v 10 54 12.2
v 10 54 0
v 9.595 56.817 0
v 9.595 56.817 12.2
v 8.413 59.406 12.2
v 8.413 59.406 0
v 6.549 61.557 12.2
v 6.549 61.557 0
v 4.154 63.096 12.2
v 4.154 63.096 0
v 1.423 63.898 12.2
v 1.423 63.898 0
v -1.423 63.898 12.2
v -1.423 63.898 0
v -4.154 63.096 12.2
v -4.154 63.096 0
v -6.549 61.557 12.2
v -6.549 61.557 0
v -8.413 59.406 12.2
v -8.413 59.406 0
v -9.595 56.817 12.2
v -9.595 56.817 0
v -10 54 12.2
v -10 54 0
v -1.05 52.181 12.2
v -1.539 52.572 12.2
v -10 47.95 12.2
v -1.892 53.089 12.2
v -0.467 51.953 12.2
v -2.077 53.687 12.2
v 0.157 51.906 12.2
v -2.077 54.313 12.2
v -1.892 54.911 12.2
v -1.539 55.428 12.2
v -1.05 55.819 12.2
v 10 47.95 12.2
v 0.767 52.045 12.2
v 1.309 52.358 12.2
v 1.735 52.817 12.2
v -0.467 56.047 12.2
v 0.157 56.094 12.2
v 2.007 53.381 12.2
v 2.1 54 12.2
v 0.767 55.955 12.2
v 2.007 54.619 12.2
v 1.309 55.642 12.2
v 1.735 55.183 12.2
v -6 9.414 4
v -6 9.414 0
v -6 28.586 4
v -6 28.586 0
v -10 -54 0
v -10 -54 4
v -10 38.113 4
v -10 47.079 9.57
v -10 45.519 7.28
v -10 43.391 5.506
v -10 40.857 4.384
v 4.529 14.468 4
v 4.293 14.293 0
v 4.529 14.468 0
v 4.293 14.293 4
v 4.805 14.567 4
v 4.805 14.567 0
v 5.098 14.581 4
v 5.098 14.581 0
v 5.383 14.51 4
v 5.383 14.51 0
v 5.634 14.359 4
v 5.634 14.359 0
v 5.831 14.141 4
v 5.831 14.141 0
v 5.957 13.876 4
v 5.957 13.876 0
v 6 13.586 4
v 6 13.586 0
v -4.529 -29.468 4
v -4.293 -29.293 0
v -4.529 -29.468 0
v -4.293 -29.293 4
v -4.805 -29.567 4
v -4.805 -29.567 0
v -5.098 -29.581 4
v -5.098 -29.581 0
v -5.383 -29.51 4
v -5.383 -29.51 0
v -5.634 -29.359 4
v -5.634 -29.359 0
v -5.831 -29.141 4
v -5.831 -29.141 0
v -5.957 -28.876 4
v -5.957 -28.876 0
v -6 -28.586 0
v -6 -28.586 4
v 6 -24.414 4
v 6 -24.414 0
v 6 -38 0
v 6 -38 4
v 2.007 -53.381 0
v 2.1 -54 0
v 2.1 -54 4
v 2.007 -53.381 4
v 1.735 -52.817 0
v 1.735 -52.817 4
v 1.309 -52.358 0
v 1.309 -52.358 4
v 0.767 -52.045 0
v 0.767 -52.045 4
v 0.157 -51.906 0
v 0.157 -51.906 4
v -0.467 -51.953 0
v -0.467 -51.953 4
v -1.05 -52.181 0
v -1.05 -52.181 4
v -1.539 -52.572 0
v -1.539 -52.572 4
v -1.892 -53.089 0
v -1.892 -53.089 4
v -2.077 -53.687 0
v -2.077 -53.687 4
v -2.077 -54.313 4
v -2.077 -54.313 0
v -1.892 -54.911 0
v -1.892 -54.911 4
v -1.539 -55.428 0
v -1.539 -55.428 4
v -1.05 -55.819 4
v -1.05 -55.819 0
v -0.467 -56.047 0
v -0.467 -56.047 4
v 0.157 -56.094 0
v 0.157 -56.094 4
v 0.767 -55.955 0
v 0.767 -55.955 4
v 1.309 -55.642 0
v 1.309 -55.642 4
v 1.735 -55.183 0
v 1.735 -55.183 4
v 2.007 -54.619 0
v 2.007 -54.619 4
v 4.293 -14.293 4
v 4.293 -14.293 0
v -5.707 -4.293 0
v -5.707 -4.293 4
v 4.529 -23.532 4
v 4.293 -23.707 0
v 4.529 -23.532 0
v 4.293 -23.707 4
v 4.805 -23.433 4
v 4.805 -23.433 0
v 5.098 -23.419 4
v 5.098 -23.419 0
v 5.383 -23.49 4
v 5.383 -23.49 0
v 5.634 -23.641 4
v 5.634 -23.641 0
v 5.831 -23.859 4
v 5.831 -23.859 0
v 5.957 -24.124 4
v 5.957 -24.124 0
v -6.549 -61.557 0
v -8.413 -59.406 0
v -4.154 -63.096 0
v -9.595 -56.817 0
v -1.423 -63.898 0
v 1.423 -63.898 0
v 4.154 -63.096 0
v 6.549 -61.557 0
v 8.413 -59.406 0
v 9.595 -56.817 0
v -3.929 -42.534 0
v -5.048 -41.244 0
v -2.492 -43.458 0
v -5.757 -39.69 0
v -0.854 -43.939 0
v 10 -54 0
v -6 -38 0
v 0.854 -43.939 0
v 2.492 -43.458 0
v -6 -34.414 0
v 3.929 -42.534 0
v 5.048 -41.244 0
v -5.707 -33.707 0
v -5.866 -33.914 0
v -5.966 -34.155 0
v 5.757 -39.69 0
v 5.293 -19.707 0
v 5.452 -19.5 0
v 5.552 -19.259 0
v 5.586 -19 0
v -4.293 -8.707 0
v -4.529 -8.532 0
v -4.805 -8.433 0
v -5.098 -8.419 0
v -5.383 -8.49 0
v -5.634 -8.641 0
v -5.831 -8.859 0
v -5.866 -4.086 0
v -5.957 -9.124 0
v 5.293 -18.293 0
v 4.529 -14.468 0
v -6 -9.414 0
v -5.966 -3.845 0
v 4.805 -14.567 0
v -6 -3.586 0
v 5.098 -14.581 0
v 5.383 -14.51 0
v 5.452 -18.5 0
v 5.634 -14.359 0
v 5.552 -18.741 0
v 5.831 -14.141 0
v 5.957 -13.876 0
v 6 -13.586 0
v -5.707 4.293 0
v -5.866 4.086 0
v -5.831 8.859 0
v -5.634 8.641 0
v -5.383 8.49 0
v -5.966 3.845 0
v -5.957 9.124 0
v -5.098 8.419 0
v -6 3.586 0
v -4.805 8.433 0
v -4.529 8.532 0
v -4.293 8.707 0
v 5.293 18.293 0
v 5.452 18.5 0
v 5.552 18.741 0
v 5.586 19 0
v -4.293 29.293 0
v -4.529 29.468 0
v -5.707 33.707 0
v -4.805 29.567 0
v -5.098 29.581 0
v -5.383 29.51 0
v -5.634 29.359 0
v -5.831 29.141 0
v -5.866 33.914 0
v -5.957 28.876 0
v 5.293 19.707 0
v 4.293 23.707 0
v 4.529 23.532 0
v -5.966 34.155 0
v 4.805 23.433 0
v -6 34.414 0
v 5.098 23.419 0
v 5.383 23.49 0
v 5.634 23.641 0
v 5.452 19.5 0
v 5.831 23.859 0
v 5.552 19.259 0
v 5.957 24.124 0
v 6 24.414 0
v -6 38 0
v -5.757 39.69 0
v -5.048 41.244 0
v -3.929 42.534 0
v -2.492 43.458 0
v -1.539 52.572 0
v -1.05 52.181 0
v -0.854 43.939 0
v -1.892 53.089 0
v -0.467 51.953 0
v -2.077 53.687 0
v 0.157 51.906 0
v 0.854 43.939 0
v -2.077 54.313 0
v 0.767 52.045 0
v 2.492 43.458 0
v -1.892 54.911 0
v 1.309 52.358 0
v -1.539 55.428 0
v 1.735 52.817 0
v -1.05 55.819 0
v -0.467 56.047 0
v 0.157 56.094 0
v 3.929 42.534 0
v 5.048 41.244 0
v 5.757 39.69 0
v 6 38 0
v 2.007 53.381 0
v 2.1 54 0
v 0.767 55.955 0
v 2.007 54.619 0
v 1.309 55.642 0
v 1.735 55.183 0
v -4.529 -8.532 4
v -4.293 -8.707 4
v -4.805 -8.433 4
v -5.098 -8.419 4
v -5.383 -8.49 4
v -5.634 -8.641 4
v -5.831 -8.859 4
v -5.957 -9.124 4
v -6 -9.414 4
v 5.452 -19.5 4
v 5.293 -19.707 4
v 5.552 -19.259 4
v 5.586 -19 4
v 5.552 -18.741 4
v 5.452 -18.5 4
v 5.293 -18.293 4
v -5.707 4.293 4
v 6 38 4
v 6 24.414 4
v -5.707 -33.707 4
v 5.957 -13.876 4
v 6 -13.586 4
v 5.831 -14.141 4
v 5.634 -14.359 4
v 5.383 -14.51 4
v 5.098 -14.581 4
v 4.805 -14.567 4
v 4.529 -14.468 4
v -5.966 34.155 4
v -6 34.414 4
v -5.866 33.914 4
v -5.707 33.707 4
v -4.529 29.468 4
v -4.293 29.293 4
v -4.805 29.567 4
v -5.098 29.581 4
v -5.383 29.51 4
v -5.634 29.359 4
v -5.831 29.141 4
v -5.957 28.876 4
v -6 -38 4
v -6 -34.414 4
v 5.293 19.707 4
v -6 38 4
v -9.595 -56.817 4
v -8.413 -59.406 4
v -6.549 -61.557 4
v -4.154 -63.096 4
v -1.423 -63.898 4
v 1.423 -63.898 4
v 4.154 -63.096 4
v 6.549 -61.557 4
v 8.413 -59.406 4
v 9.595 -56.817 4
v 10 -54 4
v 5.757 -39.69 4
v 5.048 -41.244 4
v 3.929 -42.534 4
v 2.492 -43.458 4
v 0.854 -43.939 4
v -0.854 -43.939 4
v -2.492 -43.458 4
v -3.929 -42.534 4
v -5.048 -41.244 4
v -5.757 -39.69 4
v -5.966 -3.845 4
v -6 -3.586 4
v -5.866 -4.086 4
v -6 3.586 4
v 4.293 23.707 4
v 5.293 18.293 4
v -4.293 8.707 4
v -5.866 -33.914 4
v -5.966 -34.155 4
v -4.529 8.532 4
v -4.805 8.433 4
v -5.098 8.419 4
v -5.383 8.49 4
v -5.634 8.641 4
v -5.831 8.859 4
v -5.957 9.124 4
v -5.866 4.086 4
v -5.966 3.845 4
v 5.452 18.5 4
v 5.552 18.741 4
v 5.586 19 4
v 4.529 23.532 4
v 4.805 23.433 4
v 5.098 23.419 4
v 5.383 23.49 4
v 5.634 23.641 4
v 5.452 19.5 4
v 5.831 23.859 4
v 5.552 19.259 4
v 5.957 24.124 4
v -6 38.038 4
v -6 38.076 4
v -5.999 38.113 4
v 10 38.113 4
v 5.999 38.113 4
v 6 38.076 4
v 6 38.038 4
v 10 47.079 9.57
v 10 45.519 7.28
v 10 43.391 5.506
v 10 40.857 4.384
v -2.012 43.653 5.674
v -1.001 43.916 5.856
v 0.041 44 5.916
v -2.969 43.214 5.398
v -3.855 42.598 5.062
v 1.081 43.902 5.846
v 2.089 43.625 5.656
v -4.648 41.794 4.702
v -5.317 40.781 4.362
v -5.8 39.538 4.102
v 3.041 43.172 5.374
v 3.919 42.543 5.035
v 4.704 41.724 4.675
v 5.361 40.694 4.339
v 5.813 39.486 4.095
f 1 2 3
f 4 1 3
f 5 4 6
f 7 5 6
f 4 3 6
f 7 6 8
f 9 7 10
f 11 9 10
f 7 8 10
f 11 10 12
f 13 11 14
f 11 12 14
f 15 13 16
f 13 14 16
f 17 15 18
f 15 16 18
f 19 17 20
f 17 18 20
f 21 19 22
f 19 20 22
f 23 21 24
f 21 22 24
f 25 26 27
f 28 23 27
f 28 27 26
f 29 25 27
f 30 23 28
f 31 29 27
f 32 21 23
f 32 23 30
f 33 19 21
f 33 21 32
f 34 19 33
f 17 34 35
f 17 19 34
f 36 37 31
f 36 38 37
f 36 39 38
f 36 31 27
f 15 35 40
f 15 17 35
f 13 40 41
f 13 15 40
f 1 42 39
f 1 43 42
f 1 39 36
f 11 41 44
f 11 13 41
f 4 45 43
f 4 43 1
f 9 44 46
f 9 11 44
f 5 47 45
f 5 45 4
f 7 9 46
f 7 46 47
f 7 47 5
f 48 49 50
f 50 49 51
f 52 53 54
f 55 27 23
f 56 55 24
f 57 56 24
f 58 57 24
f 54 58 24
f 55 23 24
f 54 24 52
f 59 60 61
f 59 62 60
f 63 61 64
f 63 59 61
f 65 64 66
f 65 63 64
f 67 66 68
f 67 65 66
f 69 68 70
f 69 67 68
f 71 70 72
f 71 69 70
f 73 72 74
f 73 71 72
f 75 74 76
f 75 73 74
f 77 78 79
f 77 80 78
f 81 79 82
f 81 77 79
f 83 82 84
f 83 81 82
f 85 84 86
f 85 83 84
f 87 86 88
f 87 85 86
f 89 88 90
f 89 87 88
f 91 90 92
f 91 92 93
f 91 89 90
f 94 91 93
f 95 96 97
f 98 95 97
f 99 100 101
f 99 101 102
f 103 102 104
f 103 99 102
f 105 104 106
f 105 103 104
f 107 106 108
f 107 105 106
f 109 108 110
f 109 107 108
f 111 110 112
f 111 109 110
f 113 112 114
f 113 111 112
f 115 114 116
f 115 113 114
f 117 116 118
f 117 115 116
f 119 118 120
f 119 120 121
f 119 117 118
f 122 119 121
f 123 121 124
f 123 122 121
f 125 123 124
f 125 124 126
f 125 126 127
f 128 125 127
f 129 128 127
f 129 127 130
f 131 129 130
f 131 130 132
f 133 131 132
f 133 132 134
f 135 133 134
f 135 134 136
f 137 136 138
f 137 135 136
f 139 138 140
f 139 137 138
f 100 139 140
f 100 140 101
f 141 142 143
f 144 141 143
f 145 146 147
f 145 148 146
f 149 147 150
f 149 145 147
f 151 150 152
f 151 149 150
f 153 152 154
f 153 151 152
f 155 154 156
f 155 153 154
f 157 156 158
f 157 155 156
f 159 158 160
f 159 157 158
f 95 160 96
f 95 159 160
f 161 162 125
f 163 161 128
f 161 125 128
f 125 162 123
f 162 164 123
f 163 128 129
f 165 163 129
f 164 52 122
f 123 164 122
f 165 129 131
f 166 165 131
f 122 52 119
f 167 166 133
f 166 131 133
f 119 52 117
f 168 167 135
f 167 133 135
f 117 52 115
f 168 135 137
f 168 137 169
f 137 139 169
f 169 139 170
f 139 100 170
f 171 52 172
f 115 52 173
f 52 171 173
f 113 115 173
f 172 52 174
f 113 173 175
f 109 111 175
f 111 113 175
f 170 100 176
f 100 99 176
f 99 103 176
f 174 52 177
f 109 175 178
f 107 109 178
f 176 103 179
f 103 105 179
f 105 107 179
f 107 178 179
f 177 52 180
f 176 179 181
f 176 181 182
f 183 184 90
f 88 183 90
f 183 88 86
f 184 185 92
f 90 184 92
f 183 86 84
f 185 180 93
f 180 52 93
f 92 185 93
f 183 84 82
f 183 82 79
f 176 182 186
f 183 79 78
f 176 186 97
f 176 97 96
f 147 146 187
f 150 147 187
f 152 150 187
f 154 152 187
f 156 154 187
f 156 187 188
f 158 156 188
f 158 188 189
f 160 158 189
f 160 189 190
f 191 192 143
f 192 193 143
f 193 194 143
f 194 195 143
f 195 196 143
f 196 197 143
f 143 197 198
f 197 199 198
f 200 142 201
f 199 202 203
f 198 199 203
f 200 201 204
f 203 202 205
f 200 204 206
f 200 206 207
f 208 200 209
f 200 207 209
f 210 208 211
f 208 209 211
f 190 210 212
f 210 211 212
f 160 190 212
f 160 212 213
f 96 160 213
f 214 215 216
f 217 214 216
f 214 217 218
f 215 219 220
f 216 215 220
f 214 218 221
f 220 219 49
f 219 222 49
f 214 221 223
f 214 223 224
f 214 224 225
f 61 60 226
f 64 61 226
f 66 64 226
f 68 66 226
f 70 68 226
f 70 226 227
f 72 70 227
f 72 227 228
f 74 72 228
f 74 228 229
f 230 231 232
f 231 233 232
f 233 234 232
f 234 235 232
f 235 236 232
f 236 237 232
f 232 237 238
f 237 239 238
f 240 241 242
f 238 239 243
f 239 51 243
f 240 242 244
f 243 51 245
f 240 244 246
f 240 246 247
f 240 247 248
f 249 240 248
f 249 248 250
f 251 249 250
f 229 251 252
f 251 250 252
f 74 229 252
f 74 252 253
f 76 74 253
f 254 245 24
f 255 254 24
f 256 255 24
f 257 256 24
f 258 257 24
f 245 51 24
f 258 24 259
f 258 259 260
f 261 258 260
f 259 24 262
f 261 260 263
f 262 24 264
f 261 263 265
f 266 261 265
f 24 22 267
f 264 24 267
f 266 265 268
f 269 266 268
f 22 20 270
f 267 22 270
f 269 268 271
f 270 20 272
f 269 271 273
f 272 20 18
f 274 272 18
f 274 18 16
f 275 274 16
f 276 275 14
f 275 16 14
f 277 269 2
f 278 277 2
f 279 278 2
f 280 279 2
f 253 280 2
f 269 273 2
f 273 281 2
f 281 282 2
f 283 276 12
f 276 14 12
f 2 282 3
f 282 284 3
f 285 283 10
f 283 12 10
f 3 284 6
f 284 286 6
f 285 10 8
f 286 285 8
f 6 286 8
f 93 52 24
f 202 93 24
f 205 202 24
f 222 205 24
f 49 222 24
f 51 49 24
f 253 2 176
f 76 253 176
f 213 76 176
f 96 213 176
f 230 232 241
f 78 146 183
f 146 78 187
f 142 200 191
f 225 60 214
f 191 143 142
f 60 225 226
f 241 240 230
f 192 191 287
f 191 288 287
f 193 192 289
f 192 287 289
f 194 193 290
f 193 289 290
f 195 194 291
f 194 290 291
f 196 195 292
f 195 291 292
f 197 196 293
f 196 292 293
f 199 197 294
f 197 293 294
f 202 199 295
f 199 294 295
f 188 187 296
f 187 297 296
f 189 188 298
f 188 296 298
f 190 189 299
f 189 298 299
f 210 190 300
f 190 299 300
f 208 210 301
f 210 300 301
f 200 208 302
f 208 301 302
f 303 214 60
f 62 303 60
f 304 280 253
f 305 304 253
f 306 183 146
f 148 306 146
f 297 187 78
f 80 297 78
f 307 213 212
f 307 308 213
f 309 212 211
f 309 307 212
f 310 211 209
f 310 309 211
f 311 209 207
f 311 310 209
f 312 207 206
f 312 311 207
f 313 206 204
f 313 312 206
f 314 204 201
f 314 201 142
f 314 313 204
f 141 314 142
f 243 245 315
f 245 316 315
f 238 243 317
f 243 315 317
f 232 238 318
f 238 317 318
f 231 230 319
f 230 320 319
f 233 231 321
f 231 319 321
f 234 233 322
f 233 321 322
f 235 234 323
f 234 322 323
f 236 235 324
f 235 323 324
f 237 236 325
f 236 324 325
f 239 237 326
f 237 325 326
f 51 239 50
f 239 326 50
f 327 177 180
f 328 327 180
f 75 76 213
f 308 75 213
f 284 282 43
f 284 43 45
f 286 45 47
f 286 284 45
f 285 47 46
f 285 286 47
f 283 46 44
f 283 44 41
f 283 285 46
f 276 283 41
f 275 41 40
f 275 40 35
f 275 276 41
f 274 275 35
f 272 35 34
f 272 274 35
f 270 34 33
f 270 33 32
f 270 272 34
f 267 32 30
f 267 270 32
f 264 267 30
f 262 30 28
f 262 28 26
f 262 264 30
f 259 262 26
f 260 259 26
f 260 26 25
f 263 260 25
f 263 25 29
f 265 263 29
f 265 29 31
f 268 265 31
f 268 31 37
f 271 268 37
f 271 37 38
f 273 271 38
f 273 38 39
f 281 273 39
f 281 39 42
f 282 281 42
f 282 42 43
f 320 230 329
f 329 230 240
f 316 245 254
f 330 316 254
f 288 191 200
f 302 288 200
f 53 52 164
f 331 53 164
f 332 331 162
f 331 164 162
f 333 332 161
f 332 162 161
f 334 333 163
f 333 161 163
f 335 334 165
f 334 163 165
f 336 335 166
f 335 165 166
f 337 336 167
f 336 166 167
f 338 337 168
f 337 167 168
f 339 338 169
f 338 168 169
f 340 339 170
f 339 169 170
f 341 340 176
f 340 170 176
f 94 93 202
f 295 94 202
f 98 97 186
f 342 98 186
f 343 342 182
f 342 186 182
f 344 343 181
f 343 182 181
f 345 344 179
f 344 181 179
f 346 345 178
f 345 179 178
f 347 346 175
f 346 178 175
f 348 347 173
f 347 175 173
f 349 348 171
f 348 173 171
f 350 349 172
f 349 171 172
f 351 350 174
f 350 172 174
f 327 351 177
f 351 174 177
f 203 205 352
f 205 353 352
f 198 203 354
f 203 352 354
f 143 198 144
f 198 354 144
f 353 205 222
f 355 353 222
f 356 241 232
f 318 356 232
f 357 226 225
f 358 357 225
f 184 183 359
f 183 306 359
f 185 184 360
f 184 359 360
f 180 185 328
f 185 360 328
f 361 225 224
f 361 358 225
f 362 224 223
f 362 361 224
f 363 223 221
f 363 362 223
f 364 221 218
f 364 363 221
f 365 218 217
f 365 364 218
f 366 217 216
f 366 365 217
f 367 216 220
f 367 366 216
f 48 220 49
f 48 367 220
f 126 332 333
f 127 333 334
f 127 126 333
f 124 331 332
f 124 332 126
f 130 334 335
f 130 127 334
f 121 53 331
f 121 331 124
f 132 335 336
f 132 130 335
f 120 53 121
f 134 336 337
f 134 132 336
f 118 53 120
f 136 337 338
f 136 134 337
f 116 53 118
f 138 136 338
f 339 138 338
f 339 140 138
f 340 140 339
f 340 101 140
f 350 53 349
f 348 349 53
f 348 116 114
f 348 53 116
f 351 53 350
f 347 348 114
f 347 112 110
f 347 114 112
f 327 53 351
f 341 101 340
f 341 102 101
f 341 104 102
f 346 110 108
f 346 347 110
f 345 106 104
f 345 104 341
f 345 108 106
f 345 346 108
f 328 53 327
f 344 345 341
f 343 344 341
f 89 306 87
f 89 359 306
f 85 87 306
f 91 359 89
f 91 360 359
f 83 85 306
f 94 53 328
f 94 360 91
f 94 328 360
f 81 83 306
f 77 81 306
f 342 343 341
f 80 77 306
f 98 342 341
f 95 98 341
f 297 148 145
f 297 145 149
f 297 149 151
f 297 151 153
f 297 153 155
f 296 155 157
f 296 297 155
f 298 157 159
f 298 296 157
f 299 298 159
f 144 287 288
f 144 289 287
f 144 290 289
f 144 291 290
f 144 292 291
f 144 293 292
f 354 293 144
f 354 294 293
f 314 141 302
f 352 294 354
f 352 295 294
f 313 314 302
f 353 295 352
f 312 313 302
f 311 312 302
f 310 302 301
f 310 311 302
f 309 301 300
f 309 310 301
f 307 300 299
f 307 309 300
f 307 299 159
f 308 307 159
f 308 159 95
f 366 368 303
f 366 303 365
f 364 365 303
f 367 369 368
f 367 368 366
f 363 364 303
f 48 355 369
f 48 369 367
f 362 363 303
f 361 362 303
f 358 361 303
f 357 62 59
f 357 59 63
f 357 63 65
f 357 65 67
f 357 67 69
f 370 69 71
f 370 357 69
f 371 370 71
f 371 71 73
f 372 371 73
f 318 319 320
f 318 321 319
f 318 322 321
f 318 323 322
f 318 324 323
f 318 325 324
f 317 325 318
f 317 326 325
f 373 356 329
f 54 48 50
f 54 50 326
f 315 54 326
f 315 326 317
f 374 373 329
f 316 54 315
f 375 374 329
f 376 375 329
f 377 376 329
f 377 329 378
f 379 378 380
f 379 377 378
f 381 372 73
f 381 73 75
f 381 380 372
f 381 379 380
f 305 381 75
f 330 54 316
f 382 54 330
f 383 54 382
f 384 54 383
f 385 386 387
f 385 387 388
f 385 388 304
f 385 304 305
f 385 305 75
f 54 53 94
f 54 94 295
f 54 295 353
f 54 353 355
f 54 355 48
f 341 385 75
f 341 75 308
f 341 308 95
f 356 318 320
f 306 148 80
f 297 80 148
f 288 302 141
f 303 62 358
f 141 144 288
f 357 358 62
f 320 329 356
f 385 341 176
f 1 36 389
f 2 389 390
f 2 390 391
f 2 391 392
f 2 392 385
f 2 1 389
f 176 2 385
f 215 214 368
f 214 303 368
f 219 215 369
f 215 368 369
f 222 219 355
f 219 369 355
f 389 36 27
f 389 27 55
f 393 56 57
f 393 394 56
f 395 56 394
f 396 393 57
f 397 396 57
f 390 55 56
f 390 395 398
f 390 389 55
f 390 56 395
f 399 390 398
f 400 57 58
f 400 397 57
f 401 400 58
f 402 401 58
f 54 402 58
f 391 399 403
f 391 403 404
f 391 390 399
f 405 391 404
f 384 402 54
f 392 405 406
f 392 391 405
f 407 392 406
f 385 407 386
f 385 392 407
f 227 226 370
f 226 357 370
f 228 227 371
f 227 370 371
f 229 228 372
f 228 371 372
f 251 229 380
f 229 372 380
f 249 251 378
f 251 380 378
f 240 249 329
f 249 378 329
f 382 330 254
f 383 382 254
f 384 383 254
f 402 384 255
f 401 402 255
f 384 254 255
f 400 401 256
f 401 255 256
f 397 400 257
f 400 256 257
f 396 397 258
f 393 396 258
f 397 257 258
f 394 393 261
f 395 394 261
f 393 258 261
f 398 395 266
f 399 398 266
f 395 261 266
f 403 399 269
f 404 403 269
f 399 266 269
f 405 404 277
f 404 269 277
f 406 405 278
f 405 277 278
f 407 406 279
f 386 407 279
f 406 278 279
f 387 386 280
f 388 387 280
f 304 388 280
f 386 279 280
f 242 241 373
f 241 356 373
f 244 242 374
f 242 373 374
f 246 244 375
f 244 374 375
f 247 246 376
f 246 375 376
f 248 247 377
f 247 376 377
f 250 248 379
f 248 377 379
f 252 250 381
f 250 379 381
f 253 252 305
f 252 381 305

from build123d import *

# Parameters (mm, degrees)
CROQUIS1_R              = 2.1
SALIENTE_EXTRUIR1_DEPTH = 4
CROQUIS1_6_R            = 2.1
SALIENTE_EXTRUIR3_DEPTH = 12.2
REDONDEO1_R             = 10
REDONDEO2_R             = 1


with BuildPart() as part:
    # Croquis1 → Saliente-Extruir1 (new body)
    with BuildSketch(Plane.XY):
        with BuildLine():
            ThreePointArc((10, 54), (0, 64), (-10, 54))
            Line((-10, 54), (-10, -54))
            ThreePointArc((-10, -54), (0, -64), (10, -54))
            Line((10, -54), (10, 54))
        make_face()
        with Locations((0, 54)):
            Circle(CROQUIS1_R, mode=Mode.SUBTRACT)
        with BuildLine():
            Line((6, 38), (6, 22))
            Line((6, 22), (-6, 34))
            Line((-6, 34), (-6, 38))
            ThreePointArc((-6, 38), (0, 44), (6, 38))
        make_face(mode=Mode.SUBTRACT)
        Polygon((6, 16), (6, -16), (-6, -4), (-6, 4), align=None, mode=Mode.SUBTRACT)
        with BuildLine():
            Line((6, -22), (6, -38))
            ThreePointArc((6, -38), (0, -44), (-6, -38))
            Line((-6, -38), (-6, -34))
            Line((-6, -34), (6, -22))
        make_face(mode=Mode.SUBTRACT)
        Polygon((-6, -31), (-6, -7), (6, -19), align=None, mode=Mode.SUBTRACT)
        Polygon((-6, 7), (-6, 31), (6, 19), align=None, mode=Mode.SUBTRACT)
        with Locations((0, -54)):
            Circle(CROQUIS1_R, mode=Mode.SUBTRACT)
    extrude(amount=SALIENTE_EXTRUIR1_DEPTH)

    # Croquis1<6> → Saliente-Extruir3 (add)
    with BuildSketch(Plane.XY):
        with BuildLine():
            Line((10, 47.95), (10, 54))
            ThreePointArc((10, 54), (0, 64), (-10, 54))
            Line((-10, 54), (-10, 47.95))
            Line((-10, 47.95), (10, 47.95))
        make_face()
        with Locations((0, 54)):
            Circle(CROQUIS1_6_R, mode=Mode.SUBTRACT)
    extrude(amount=SALIENTE_EXTRUIR3_DEPTH)

    # Redondeo1
    # the kernel refuses this fillet: 10 mm, written as the material it adds along each edge
    with BuildSketch(Plane(origin=(10, 47.95, 4), x_dir=(0, 0, 1), z_dir=(-1, 0, 0))) as redondeo1_piece_1_section:
        with BuildLine():
            CenterArc((10, -9.836666102), REDONDEO1_R, 100.369759805, 79.630240195)
            Line((0, -9.836666102), (-0.2, -9.836666102))
            Line((-0.2, -9.836666102), (-0.2, 0))
            Line((-0.2, 0), (0, 0.2))
            ThreePointArc((0, 0.2), (4.1, 0.2), (8.164, 0.196733322))
            Line((8.164, 0.196733322), (8.2, 0))
        make_face()
    redondeo1_piece_1 = extrude(amount=20, mode=Mode.PRIVATE)
    redondeo1_piece_1 = redondeo1_piece_1 - Plane(origin=(0, 38, 6.176378177), x_dir=(-1, 0, 0), z_dir=(0, 0, -1)) * Cylinder(6, 80, mode=Mode.PRIVATE)
    add(redondeo1_piece_1)

    # Redondeo2
    redondeo2_edges = [part.edges().sort_by_distance(p)[0] for p in [
        (6, 22, 2),
        (-6, 34, 2),
        (6, -22, 2),
        (-6, -34, 2),
        (-6, -31, 2),
        (6, -19, 2),
        (-6, -7, 2),
        (-6, -4, 2),
        (6, -16, 2),
        (6, 16, 2),
        (-6, 4, 2),
        (-6, 7, 2),
        (6, 19, 2),
        (-6, 31, 2),
    ]]
    fillet(redondeo2_edges, radius=REDONDEO2_R)


solid = part.part
